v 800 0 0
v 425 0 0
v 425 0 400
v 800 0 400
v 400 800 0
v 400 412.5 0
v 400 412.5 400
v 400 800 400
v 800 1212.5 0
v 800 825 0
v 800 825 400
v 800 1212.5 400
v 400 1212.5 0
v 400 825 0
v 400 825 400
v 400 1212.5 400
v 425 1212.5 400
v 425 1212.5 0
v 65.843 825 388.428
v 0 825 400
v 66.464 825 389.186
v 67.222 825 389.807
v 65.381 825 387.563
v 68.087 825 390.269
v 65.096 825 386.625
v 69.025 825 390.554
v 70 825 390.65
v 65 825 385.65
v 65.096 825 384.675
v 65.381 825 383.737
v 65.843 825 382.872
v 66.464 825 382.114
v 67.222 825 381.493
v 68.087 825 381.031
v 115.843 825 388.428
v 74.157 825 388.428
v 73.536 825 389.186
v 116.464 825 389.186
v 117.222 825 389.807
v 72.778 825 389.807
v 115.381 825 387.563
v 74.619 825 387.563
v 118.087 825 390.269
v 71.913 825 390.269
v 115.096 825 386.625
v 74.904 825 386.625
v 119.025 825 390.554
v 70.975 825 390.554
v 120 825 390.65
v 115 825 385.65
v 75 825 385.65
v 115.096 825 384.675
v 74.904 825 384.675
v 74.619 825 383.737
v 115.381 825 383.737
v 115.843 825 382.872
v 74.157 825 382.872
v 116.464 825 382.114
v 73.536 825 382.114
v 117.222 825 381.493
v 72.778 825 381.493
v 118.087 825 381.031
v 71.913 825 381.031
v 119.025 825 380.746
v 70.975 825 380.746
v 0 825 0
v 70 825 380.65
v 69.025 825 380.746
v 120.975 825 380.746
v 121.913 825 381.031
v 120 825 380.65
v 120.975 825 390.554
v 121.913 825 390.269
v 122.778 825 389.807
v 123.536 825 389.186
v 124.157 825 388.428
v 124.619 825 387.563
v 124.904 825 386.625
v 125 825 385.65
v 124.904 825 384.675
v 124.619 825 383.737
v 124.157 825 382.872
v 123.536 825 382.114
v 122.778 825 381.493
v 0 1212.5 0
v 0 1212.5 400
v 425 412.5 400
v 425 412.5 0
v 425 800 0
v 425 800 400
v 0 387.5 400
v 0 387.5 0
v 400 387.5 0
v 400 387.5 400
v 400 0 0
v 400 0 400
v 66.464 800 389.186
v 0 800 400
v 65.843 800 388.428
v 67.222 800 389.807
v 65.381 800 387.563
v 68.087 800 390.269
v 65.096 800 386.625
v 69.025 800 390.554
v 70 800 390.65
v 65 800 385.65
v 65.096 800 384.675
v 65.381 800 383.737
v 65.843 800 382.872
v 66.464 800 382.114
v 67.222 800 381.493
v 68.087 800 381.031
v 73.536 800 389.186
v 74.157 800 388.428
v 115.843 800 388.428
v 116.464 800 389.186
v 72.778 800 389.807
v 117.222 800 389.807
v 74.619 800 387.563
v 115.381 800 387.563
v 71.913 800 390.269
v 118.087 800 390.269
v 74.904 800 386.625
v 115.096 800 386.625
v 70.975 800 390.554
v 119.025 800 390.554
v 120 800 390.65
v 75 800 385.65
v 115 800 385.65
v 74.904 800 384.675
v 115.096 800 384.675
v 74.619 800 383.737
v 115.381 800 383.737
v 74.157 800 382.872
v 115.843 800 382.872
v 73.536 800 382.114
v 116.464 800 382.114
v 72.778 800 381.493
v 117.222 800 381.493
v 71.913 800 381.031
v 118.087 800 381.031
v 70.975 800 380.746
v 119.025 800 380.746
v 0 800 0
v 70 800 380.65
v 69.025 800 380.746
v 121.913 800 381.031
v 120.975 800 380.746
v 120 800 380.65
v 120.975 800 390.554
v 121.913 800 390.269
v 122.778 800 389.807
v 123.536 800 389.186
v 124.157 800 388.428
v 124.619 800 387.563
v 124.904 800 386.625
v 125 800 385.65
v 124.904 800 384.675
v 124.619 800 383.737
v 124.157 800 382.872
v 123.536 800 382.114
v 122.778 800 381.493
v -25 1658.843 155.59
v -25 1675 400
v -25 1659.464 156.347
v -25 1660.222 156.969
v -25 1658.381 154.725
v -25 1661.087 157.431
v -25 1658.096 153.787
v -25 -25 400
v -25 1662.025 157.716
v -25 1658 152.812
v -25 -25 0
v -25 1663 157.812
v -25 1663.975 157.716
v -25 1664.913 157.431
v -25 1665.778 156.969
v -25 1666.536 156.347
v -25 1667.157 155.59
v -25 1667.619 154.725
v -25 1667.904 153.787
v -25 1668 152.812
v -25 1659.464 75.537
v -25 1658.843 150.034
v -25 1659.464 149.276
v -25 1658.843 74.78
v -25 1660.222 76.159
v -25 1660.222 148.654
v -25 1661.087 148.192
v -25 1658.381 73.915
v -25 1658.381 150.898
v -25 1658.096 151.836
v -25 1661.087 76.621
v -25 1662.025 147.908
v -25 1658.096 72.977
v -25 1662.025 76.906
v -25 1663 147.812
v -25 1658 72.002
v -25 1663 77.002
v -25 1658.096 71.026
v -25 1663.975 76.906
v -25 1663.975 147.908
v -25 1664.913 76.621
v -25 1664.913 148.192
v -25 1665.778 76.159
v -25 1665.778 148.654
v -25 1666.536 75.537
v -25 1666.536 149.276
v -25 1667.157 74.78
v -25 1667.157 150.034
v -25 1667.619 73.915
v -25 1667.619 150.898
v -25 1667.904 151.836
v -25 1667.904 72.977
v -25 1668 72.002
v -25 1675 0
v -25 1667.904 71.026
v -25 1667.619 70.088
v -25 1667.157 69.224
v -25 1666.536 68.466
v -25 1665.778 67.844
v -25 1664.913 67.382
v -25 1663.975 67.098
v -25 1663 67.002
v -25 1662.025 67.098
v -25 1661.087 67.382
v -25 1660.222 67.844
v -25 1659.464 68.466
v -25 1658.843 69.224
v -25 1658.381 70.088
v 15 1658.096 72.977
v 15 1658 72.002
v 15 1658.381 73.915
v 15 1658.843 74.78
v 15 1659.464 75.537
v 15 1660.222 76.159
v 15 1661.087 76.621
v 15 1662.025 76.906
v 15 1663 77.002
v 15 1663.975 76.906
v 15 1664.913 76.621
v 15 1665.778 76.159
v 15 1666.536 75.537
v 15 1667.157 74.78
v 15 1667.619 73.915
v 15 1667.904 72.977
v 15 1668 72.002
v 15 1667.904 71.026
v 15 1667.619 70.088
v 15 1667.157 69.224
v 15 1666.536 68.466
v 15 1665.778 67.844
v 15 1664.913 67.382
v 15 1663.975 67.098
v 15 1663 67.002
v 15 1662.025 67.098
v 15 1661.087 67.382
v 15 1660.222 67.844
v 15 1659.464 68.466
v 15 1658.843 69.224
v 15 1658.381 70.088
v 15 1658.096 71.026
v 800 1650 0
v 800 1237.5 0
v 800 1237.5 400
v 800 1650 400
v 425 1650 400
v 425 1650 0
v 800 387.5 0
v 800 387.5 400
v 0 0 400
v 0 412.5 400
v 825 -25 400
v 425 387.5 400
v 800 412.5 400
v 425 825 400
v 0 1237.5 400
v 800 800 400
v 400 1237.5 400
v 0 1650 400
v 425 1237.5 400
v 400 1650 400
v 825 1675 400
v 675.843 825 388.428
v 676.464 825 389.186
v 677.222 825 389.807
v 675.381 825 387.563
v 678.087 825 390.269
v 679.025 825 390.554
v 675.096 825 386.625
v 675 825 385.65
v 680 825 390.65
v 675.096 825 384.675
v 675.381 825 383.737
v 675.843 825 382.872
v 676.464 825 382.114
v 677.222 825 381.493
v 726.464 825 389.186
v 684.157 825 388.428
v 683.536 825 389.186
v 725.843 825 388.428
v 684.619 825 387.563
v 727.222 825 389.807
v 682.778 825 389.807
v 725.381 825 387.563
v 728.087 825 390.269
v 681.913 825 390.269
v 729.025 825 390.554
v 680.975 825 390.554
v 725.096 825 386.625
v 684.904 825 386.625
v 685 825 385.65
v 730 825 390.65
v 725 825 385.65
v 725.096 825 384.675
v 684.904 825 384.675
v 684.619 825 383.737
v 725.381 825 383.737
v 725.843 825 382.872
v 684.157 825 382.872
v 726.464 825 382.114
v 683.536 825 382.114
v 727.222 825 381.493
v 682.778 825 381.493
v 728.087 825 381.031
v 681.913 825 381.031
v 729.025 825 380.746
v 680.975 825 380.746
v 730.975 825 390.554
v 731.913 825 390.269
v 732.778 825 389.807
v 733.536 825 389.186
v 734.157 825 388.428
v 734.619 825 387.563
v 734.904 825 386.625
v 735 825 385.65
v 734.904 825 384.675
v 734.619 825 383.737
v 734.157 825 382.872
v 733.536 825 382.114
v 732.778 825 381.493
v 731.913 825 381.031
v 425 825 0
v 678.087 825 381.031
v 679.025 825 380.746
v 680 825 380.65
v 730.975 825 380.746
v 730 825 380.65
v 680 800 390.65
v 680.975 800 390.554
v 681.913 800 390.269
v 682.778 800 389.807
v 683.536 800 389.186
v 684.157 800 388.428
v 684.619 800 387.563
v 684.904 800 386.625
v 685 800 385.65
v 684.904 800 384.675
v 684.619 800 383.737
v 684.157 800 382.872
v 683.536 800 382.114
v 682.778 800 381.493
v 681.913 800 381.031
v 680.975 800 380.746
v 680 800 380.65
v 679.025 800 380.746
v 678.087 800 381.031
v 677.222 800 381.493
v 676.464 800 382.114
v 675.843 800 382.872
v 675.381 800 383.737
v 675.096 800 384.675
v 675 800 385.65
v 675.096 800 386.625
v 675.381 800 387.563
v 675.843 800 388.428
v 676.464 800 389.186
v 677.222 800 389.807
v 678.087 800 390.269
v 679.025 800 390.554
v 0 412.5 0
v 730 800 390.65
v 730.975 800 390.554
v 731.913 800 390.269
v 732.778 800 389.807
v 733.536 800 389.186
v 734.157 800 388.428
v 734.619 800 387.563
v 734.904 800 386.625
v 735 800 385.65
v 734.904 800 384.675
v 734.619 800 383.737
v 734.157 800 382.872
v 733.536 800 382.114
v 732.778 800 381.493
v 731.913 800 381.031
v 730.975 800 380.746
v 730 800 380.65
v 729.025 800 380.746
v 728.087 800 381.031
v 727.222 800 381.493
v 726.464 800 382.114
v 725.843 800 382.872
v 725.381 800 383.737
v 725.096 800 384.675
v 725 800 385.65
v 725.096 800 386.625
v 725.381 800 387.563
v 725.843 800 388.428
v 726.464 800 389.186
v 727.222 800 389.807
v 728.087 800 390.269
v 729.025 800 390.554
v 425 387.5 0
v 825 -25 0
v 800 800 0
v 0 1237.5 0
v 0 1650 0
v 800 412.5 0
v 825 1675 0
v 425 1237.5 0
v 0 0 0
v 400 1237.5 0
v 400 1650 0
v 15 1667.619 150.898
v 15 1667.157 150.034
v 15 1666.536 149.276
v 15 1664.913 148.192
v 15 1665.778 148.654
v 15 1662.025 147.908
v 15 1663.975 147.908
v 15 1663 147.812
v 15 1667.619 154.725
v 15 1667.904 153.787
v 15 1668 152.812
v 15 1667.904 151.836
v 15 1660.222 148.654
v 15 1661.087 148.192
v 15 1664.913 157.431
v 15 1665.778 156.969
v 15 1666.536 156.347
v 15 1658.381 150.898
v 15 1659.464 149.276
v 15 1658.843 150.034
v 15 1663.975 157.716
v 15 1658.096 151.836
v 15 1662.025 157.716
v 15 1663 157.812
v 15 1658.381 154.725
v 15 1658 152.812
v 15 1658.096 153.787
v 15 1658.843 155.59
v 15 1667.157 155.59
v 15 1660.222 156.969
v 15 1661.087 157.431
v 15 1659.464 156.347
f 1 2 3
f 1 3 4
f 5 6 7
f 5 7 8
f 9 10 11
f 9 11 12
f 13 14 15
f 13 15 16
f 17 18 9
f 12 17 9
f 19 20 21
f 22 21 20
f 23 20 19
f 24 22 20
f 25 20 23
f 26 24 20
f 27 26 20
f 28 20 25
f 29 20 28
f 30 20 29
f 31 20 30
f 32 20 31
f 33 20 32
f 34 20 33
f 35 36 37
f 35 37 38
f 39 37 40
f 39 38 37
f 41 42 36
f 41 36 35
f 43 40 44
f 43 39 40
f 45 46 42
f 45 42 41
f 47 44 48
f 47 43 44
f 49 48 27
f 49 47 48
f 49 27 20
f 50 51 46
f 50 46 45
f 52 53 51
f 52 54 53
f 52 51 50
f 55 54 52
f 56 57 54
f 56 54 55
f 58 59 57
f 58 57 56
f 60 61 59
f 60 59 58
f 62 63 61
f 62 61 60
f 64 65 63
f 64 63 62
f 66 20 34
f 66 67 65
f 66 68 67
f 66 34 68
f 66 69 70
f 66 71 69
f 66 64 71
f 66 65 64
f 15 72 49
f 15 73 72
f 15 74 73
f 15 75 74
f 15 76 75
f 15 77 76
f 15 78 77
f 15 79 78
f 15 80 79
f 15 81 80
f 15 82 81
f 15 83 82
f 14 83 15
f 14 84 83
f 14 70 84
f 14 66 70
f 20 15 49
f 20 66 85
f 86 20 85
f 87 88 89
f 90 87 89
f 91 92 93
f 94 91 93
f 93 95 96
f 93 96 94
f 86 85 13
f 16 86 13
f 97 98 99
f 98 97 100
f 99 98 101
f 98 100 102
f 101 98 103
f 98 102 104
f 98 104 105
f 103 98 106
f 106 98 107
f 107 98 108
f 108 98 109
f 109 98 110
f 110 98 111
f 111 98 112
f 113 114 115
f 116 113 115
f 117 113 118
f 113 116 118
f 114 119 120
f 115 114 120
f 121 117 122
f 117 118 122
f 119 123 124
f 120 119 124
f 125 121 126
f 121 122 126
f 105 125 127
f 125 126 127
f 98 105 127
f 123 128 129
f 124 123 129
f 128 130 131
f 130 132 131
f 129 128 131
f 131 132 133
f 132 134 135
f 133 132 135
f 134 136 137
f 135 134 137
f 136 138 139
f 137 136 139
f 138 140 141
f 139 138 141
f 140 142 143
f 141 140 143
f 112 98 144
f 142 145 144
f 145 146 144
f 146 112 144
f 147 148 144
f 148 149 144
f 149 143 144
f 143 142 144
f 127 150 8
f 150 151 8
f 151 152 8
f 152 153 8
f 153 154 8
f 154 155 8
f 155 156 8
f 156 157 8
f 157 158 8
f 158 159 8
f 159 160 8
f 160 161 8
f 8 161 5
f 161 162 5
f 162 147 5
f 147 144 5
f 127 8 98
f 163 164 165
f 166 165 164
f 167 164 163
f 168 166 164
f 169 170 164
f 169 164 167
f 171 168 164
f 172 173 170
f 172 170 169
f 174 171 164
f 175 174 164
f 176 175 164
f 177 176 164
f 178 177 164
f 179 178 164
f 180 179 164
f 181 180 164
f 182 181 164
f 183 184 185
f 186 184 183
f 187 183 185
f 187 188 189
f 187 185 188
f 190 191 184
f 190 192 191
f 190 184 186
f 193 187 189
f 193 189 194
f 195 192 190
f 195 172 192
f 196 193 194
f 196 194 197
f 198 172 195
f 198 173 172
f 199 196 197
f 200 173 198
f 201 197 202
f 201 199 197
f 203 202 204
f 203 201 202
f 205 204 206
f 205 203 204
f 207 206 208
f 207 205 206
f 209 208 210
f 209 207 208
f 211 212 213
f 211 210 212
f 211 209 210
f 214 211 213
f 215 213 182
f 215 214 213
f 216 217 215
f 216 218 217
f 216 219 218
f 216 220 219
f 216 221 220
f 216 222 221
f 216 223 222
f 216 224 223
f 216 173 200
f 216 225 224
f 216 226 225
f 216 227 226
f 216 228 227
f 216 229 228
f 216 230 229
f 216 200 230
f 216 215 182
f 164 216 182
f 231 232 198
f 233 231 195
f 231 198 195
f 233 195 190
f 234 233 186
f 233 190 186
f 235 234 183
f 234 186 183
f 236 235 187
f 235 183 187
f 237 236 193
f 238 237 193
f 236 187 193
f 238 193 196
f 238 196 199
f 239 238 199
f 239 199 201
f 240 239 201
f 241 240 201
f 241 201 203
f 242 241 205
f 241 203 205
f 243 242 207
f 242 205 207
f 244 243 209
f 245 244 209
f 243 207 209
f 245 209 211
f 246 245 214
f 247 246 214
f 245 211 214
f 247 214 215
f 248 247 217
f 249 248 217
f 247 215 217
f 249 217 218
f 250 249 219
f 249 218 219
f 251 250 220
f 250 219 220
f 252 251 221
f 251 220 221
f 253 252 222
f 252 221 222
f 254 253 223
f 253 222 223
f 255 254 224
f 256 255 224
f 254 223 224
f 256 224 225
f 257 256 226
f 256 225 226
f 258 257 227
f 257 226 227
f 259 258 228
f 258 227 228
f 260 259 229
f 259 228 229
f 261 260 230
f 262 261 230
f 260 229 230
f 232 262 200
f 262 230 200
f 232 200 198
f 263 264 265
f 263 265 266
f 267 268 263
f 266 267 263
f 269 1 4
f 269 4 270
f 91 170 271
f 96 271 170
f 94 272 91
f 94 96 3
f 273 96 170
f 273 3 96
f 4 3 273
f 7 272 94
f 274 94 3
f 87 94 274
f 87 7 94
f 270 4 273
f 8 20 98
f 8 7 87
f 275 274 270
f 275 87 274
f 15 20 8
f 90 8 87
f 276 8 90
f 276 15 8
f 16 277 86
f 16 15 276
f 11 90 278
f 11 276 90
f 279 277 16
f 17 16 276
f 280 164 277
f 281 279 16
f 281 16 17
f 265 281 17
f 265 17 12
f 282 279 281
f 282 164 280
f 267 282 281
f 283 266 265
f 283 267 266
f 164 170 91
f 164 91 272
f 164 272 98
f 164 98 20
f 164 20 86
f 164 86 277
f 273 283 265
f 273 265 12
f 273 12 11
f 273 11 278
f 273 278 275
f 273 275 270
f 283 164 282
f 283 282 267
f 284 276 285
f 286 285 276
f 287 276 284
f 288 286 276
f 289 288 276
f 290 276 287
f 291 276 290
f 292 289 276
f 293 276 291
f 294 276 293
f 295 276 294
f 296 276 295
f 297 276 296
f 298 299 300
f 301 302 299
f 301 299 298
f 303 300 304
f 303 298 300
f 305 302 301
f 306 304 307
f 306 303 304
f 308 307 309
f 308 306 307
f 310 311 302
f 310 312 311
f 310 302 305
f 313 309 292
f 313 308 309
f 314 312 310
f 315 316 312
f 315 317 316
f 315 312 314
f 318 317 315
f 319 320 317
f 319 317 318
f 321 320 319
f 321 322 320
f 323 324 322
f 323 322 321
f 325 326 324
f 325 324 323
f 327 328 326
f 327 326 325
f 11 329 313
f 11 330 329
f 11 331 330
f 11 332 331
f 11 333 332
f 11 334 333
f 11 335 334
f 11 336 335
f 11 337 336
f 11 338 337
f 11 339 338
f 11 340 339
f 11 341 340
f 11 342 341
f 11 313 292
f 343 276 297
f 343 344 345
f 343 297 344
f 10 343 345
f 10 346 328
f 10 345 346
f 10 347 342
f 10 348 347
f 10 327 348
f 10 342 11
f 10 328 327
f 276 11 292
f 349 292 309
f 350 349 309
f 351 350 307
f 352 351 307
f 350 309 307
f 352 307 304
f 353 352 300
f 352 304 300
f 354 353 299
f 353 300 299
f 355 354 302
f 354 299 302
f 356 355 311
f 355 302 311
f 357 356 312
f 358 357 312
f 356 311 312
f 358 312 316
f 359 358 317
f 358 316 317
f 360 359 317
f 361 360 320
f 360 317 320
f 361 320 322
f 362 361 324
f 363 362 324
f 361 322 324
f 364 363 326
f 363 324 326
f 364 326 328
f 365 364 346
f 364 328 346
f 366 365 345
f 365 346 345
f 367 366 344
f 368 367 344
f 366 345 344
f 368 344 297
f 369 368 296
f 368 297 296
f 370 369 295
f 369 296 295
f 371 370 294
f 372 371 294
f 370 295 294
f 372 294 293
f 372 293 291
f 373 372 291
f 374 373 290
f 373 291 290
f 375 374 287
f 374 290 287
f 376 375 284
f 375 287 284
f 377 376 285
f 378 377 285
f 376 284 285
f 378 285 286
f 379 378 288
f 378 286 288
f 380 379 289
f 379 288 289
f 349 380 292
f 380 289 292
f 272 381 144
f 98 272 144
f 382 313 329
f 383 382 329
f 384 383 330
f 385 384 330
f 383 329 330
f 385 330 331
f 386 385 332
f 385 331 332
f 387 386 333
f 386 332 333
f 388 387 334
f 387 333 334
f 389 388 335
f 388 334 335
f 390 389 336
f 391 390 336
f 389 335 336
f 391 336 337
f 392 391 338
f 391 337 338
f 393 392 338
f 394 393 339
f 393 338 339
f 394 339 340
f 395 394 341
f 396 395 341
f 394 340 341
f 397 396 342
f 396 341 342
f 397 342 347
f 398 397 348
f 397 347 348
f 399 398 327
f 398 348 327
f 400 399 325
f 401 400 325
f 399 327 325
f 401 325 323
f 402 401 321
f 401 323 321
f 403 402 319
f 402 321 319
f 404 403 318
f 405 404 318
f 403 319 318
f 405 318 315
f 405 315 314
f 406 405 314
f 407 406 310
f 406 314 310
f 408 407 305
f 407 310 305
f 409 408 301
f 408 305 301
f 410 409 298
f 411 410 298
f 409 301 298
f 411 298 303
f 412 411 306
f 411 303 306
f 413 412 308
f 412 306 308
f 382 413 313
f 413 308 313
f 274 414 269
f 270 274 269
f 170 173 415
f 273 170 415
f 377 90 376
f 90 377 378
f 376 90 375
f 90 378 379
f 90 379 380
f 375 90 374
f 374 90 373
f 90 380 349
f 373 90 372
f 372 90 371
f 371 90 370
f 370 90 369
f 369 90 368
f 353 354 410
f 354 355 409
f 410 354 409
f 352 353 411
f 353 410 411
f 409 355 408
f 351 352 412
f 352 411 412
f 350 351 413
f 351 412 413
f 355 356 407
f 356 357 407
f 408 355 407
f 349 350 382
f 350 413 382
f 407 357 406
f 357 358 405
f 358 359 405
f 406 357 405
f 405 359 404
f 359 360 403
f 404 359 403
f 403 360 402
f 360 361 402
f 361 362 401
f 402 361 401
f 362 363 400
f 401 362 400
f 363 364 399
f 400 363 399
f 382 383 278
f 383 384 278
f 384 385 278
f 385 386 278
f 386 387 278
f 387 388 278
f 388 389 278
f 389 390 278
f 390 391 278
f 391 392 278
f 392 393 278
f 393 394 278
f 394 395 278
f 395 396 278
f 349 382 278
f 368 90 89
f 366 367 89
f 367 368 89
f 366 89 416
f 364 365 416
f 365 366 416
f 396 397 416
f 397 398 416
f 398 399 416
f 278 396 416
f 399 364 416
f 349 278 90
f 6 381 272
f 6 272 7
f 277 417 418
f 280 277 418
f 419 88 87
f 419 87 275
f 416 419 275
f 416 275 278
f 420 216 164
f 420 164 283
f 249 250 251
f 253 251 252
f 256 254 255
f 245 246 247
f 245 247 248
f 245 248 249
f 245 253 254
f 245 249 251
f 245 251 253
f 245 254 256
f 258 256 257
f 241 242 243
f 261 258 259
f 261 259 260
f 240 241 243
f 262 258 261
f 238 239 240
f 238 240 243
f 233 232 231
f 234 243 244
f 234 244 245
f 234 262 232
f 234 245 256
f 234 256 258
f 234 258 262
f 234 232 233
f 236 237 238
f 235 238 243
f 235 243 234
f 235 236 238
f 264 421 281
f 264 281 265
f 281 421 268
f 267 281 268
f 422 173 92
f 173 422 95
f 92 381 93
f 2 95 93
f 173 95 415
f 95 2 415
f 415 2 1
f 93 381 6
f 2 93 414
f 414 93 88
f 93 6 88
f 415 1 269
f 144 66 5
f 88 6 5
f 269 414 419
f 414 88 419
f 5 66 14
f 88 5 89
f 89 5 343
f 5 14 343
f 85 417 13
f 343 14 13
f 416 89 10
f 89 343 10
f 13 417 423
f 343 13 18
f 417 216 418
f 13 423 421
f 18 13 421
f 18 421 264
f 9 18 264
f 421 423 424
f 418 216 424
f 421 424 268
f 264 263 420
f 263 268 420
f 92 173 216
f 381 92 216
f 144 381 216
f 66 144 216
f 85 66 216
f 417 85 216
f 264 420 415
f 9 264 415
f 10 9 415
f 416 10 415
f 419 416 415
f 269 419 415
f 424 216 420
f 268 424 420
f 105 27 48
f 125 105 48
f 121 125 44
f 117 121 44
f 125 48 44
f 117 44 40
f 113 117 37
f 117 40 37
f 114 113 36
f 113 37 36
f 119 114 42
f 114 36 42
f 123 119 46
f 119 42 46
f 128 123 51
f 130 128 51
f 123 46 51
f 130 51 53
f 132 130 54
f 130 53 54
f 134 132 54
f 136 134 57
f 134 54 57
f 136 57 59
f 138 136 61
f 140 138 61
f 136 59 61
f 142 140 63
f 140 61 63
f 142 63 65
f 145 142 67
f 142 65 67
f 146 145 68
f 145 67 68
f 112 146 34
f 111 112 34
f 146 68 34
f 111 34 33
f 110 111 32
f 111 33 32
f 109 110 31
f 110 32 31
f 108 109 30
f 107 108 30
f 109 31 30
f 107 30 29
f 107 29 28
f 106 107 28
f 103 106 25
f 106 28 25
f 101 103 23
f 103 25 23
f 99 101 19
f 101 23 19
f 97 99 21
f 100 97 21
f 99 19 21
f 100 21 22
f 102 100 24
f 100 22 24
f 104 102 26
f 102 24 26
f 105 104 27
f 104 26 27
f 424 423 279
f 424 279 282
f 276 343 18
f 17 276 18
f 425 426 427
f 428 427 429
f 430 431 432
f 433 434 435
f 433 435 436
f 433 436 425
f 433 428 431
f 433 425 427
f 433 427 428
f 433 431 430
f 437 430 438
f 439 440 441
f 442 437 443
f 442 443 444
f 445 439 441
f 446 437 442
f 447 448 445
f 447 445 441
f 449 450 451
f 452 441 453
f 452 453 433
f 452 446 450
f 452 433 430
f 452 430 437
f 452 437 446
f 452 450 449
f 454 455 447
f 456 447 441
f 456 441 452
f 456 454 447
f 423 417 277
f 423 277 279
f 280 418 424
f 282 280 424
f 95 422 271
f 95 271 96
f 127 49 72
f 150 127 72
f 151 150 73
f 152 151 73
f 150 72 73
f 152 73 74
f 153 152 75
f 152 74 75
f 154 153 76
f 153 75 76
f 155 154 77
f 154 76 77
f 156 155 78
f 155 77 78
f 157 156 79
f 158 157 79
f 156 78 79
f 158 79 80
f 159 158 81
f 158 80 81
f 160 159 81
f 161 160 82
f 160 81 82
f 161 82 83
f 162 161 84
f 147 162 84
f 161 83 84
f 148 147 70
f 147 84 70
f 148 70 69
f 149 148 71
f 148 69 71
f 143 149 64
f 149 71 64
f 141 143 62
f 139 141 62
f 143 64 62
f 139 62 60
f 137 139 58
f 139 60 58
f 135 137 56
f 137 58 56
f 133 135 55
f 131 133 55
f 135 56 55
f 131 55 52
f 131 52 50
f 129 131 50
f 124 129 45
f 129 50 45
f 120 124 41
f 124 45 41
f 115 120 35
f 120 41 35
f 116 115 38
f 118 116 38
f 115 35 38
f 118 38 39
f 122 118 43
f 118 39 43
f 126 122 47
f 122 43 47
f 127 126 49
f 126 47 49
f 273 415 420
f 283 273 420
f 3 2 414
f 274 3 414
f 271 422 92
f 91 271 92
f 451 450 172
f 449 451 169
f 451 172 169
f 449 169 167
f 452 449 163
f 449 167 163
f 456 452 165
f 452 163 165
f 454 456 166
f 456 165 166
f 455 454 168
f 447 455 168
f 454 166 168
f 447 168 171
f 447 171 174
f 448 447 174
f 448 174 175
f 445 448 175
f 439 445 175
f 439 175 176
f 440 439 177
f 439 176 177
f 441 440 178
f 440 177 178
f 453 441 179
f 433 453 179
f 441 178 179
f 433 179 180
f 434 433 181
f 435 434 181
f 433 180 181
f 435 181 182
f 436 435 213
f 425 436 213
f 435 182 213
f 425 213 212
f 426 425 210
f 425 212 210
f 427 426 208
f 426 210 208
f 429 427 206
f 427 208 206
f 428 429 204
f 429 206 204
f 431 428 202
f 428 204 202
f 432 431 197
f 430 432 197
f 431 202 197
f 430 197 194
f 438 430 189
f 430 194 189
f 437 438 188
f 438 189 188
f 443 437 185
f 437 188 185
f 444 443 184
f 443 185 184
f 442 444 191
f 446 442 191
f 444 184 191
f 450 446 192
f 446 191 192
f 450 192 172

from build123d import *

# Parameters (mm, degrees)
SZKIC1_W                          = 850
SZKIC1_H                          = 1700
SZKIC1_W_2                        = 800
SZKIC1_H_2                        = 1650
SZKIC1_H_3                        = 25
SZKIC1_W_3                        = 25
WYCI_GNI_CIE_CIENKA_CIANKA1_DEPTH = 400
SZKIC2_R                          = 5
WYTNIJ_WYCI_GNI_CIE1_DEPTH        = 25
SZKIC4_R                          = 5
WYTNIJ_WYCI_GNI_CIE2_DEPTH        = 25
SZKIC6_R                          = 5
WYTNIJ_WYCI_GNI_CIE3_DEPTH        = 40


with BuildPart() as part:
    # Szkic1 → Wyciągnięcie-cienka ścianka1 (new body)
    # profile 1 of 5: a face of its own
    with BuildSketch(Plane.XY):
        with Locations((400, 825)):
            Rectangle(SZKIC1_W, SZKIC1_H)
        with Locations((400, 825)):
            Rectangle(SZKIC1_W_2, SZKIC1_H_2, mode=Mode.SUBTRACT)
    # profile 2 of 5: a face of its own
    with BuildSketch(Plane.XY):
        with Locations((400, 400)):
            Rectangle(SZKIC1_W_2, SZKIC1_H_3)
    # profile 3 of 5: a face of its own
    with BuildSketch(Plane.XY):
        with Locations((412.5, 825)):
            Rectangle(SZKIC1_W_3, SZKIC1_H_2)
    # profile 4 of 5: a face of its own
    with BuildSketch(Plane.XY):
        with Locations((400, 812.5)):
            Rectangle(SZKIC1_W_2, SZKIC1_H_3)
    # profile 5 of 5: a face of its own
    with BuildSketch(Plane.XY):
        with Locations((400, 1225)):
            Rectangle(SZKIC1_W_2, SZKIC1_H_3)
    extrude(amount=WYCI_GNI_CIE_CIENKA_CIANKA1_DEPTH)

    # Szkic2 → Wytnij-wyciągnięcie1 (cut)
    with BuildSketch(Plane(origin=(0, 825, 0), x_dir=(1, 0, 0), z_dir=(0, 1, 0))):
        with Locations(Location((70, -385.65, 0), (0, 0, 270))):
            Circle(SZKIC2_R)
        with Locations(Location((120, -385.65, 0), (0, 0, 270))):
            Circle(SZKIC2_R)
    extrude(amount=-WYTNIJ_WYCI_GNI_CIE1_DEPTH, mode=Mode.SUBTRACT)

    # Szkic4 → Wytnij-wyciągnięcie2 (cut)
    with BuildSketch(Plane(origin=(0, 825, 0), x_dir=(1, 0, 0), z_dir=(0, 1, 0))):
        with Locations(Location((730, -385.65, 0), (0, 0, 270))):
            Circle(SZKIC4_R)
        with Locations(Location((680, -385.65, 0), (0, 0, 270))):
            Circle(SZKIC4_R)
    extrude(amount=-WYTNIJ_WYCI_GNI_CIE2_DEPTH, mode=Mode.SUBTRACT)

    # Szkic6 → Wytnij-wyciągnięcie3 (cut)
    with BuildSketch(Plane.ZY.offset(25)):
        with Locations(Location((72.001673976, 1663, 0), (0, 0, 270))):
            Circle(SZKIC6_R)
        with Locations(Location((152.811673976, 1663, 0), (0, 0, 270))):
            Circle(SZKIC6_R)
    extrude(amount=-WYTNIJ_WYCI_GNI_CIE3_DEPTH, mode=Mode.SUBTRACT)


solid = part.part
